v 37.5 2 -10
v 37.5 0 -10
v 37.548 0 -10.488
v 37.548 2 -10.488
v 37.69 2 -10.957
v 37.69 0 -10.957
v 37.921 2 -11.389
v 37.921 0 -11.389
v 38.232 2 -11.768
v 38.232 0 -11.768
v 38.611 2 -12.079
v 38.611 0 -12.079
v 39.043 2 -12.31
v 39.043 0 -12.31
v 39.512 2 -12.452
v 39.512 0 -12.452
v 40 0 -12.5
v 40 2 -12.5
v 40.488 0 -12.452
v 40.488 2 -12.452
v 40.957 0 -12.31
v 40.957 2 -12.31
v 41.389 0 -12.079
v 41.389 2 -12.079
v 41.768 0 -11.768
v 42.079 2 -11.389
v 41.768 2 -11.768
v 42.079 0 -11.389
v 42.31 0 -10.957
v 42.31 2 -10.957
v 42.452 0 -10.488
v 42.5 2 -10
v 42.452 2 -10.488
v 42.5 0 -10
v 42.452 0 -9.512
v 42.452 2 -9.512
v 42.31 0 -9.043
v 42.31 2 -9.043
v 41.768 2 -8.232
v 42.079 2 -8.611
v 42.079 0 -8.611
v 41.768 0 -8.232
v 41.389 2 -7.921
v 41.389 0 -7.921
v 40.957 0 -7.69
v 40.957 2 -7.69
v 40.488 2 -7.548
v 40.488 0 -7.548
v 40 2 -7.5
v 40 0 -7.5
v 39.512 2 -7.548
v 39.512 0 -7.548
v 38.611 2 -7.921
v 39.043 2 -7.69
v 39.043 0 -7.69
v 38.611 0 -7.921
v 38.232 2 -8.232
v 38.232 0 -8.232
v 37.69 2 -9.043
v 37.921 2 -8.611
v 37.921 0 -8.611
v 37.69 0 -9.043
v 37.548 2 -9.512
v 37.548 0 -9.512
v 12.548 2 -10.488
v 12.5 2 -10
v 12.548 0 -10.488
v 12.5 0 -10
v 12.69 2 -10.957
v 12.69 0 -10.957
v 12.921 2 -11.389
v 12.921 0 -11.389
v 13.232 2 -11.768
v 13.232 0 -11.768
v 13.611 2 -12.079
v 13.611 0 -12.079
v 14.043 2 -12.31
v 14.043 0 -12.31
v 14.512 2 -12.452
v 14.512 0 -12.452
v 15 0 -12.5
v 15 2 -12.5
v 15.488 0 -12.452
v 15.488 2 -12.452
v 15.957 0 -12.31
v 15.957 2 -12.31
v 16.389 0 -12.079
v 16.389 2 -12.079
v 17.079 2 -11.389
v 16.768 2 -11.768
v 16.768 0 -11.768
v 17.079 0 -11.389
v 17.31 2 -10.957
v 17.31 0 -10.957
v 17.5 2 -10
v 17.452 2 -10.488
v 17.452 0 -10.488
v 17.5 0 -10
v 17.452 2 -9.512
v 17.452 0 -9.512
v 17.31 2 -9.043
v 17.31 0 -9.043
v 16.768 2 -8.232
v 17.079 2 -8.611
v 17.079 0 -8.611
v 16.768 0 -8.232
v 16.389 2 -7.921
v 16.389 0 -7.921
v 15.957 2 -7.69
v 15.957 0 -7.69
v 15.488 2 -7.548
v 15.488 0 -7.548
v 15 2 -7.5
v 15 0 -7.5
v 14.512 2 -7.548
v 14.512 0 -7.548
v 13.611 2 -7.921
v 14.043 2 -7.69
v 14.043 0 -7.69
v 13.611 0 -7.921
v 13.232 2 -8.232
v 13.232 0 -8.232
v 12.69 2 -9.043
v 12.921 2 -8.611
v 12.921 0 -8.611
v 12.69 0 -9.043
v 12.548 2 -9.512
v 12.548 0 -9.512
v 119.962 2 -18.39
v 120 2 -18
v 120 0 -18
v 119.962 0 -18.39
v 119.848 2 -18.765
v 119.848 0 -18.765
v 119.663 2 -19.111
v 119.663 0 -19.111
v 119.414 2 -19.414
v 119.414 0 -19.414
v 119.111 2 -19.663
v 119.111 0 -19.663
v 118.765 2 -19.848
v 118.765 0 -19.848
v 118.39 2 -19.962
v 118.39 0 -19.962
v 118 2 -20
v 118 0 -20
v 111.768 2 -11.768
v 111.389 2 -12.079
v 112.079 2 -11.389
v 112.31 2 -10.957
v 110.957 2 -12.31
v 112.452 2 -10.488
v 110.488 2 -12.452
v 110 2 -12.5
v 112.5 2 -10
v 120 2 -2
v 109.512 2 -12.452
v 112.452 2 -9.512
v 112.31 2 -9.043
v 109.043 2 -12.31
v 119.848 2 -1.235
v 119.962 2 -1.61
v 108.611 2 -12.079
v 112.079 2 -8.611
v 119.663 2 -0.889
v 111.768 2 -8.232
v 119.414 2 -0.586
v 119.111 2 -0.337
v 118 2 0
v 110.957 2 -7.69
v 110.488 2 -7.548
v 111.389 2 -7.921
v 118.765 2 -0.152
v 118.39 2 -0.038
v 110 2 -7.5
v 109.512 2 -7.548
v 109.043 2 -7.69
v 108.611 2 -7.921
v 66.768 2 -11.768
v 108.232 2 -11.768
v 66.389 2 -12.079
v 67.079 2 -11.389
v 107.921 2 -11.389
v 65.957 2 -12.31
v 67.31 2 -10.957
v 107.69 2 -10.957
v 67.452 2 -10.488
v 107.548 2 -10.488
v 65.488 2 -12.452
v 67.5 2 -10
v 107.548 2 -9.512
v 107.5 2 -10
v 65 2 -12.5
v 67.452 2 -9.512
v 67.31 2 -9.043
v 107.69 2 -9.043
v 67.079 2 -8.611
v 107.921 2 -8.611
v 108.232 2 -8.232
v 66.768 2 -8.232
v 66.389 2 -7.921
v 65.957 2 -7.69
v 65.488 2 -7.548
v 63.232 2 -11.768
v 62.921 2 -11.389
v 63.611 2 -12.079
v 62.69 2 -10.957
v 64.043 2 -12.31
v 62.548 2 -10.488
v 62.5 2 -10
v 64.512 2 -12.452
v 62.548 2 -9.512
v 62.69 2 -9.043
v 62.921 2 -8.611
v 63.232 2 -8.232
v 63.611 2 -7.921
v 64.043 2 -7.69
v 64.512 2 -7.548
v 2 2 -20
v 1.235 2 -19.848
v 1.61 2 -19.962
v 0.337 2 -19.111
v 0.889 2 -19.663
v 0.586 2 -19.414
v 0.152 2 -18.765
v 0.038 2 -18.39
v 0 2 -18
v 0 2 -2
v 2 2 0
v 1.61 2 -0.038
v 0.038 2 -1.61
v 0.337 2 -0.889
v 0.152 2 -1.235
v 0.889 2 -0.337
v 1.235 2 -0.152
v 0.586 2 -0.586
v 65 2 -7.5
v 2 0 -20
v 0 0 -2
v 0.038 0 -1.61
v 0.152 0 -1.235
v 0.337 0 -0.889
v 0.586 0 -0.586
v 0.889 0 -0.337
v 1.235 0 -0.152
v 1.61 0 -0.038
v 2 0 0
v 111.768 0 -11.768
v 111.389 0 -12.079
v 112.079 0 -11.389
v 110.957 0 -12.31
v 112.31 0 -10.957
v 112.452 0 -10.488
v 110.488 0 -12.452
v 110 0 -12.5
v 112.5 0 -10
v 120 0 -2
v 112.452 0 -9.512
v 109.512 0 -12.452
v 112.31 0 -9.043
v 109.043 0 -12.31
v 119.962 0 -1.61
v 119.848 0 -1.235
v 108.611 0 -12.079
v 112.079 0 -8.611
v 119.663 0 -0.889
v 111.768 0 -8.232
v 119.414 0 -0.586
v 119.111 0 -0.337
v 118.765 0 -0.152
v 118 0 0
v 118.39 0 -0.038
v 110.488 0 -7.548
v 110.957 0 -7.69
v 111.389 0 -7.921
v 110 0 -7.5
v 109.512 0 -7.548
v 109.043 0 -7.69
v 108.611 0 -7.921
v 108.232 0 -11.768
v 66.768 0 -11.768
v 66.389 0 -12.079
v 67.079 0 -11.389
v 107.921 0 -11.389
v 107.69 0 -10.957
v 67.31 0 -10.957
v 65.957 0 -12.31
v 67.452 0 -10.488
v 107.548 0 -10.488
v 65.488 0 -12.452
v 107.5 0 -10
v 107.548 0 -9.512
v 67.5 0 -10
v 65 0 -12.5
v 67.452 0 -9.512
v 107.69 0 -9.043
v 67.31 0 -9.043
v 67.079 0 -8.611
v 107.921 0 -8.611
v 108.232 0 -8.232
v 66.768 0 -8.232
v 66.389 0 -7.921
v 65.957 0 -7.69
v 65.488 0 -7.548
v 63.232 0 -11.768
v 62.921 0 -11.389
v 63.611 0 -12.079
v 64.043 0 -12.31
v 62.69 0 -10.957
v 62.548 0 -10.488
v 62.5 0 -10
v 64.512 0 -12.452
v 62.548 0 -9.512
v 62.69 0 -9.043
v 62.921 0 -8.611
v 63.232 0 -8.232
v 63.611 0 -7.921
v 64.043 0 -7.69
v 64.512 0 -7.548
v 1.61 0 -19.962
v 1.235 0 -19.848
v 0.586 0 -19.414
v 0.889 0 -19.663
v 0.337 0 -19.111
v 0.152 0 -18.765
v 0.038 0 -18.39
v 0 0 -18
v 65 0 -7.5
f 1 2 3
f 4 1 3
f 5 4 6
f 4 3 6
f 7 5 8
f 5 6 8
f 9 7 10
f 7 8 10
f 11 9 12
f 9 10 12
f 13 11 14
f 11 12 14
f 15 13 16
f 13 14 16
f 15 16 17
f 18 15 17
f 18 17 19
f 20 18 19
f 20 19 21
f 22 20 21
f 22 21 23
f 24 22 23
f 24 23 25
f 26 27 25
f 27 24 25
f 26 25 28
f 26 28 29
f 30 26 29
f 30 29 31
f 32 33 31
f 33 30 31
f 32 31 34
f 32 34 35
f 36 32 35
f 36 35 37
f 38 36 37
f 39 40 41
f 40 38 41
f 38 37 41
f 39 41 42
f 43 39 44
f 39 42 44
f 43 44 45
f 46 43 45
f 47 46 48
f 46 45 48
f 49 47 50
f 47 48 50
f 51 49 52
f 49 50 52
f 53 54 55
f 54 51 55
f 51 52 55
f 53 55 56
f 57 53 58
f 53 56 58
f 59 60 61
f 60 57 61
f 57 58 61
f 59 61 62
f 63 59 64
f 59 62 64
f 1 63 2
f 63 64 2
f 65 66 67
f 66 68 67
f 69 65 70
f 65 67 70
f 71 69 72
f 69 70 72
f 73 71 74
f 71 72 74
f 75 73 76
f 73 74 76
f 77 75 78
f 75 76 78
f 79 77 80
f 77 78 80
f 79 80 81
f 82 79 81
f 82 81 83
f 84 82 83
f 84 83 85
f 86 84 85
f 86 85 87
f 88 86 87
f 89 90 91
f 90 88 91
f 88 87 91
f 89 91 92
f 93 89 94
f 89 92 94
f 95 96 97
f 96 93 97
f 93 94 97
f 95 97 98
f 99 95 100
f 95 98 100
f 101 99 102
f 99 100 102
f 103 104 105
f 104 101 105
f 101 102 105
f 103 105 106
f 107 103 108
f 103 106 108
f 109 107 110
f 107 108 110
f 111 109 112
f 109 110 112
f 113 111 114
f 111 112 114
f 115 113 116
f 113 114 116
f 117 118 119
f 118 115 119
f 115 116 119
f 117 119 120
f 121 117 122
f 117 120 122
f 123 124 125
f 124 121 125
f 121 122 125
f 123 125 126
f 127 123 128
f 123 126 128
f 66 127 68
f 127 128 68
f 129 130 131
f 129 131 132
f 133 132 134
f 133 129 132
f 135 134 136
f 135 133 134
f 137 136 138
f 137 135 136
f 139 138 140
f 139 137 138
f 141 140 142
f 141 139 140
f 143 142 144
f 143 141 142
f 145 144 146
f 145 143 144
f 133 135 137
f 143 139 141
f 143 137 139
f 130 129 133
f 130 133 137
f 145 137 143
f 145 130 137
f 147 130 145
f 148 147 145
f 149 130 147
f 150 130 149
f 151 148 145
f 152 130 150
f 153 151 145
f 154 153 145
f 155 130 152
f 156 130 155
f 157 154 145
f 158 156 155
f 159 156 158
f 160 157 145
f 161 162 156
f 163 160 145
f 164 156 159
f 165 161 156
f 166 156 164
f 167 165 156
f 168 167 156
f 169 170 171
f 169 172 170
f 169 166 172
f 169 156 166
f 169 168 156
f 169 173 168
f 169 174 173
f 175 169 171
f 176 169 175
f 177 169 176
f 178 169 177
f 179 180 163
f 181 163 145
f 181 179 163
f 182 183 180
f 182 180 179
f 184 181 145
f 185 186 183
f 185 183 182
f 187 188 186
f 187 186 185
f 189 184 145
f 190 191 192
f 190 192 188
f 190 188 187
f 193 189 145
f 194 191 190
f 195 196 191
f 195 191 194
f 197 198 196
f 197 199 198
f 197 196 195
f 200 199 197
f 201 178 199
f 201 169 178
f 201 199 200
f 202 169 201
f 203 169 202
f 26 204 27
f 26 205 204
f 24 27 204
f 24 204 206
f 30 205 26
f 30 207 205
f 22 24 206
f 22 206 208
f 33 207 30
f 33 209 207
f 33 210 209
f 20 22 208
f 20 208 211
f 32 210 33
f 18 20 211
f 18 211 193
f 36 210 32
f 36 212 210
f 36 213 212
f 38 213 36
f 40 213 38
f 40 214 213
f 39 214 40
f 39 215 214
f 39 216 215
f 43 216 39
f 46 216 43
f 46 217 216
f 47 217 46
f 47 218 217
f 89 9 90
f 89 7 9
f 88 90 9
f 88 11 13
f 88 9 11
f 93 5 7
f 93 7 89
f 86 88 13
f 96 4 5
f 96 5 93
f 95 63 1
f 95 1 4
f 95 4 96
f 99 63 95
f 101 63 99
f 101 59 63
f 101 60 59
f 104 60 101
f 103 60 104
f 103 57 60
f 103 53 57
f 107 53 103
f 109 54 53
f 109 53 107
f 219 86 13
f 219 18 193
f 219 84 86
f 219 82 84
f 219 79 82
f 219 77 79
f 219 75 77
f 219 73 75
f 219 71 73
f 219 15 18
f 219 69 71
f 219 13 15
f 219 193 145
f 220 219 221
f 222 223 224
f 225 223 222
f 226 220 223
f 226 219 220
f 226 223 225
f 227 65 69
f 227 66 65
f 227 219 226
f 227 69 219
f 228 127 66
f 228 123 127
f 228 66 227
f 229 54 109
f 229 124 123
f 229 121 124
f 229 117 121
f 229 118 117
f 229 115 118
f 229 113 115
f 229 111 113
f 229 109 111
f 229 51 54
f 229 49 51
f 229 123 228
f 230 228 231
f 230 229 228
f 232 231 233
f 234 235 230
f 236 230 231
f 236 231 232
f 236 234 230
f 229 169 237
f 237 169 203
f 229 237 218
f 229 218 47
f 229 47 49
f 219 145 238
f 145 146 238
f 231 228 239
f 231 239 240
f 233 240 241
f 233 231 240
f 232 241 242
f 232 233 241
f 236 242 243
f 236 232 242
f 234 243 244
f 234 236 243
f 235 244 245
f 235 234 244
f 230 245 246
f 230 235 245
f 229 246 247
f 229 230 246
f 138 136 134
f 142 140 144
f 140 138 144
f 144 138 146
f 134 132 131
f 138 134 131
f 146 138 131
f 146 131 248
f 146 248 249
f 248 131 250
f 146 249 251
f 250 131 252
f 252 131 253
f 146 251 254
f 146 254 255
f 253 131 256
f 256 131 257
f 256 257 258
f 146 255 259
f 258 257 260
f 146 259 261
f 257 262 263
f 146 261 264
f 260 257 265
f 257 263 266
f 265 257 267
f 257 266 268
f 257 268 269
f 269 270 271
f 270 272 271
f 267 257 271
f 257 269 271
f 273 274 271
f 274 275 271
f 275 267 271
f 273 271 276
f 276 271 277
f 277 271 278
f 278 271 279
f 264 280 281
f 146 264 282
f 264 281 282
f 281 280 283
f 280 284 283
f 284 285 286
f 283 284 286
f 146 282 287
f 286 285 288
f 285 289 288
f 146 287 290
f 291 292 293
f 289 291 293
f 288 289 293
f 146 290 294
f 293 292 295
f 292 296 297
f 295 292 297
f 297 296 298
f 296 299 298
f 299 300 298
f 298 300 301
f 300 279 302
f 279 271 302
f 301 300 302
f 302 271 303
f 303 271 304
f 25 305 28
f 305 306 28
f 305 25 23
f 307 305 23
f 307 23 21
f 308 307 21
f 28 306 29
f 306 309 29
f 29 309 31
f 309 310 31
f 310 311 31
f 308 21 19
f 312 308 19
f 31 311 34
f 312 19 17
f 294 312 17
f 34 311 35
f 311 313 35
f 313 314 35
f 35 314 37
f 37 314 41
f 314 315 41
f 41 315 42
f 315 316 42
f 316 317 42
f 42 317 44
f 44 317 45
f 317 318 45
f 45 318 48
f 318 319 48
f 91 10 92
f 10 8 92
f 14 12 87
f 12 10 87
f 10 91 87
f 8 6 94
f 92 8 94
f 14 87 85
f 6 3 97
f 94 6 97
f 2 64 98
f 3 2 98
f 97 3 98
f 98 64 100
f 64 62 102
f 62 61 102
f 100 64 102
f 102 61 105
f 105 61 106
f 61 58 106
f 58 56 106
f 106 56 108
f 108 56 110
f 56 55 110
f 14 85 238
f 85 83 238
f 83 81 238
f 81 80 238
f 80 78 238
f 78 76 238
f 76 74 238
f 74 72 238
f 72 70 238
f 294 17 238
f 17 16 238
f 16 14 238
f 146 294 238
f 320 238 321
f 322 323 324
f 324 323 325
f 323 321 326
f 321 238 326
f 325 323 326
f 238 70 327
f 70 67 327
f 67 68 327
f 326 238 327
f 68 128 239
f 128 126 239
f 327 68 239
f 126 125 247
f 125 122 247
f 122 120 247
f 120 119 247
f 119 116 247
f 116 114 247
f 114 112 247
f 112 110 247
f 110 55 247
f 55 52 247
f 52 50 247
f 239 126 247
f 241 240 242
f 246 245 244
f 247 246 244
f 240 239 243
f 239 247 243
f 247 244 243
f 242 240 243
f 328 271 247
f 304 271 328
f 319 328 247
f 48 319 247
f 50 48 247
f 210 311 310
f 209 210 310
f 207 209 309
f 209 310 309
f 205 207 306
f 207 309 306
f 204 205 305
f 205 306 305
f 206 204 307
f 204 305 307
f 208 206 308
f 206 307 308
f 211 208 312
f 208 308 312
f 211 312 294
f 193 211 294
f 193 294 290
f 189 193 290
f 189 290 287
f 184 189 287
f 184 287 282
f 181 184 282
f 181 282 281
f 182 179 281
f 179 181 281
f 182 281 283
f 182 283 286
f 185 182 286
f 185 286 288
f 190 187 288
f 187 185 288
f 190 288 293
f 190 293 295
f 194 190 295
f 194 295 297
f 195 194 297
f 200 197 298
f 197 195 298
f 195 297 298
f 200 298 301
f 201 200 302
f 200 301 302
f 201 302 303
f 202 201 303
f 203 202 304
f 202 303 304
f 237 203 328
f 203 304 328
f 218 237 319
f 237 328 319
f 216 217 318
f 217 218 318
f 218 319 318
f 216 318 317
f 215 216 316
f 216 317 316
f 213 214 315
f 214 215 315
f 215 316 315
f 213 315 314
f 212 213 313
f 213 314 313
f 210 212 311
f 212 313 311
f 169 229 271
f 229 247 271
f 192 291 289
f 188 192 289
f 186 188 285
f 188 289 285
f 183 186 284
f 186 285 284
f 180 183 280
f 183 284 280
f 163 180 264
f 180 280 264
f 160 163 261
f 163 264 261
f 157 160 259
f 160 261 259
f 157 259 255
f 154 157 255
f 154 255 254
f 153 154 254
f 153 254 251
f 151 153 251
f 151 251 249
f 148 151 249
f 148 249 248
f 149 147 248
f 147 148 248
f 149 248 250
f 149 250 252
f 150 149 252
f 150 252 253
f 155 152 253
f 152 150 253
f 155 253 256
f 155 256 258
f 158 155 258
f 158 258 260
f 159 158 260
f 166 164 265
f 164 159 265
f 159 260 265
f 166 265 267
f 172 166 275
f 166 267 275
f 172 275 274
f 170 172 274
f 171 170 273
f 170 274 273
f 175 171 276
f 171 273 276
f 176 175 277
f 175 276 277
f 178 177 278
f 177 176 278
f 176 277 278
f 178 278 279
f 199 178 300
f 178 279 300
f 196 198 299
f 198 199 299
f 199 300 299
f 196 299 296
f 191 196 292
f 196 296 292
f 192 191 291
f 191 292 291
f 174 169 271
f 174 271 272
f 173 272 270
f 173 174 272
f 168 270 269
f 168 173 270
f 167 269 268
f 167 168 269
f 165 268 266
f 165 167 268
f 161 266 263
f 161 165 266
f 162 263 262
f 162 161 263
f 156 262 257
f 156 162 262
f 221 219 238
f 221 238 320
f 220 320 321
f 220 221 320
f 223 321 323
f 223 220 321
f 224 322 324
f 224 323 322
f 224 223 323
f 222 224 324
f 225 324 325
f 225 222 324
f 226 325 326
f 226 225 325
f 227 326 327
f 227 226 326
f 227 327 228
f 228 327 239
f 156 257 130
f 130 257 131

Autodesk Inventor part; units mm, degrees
ref_plane "YZ Plane" through (0, 0, 0) normal (1, 0, 0) x (0, 1, 0)
ref_plane "XZ Plane" through (0, 0, 0) normal (0, 1, 0) x (-1, 0, 0)
ref_plane "XY Plane" through (0, 0, 0) normal (0, 0, 1) x (1, 0, 0)
sketch "Sketch4" plane through (0, 0, 0) normal (0, 1, 0) x (-1, 0, 0)
  line L0 (0, 0) -> (-120, 0)
  line L1 (-120, 0) -> (-120, -20)
  line L2 (-120, -20) -> (0, -20)
  line L3 (0, -20) -> (0, 0)
  circle A0 centre (-15, -10) radius 2.5
  circle A1 centre (-40, -10) radius 2.5
  circle A2 centre (-65, -10) radius 2.5
  circle A3 centre (-110, -10) radius 2.5
  dimension "d6" = 120
  dimension "d7" = 20
  dimension "d11" = 5
  dimension "d12" = 5
  dimension "d13" = 5
  dimension "d14" = 5
  dimension "d15" = 10
  dimension "d16" = 15
  dimension "d17" = 25
  dimension "d18" = 25
extrude "Extrusion2" add sketch "Sketch4" along normal blind 2
fillet "Fillet2" radius 2 4 edges at (0, 1, -20) (0, 1, 0) (120, 1, 0) (120, 1, -20)
properties part number "Connector_H2"
